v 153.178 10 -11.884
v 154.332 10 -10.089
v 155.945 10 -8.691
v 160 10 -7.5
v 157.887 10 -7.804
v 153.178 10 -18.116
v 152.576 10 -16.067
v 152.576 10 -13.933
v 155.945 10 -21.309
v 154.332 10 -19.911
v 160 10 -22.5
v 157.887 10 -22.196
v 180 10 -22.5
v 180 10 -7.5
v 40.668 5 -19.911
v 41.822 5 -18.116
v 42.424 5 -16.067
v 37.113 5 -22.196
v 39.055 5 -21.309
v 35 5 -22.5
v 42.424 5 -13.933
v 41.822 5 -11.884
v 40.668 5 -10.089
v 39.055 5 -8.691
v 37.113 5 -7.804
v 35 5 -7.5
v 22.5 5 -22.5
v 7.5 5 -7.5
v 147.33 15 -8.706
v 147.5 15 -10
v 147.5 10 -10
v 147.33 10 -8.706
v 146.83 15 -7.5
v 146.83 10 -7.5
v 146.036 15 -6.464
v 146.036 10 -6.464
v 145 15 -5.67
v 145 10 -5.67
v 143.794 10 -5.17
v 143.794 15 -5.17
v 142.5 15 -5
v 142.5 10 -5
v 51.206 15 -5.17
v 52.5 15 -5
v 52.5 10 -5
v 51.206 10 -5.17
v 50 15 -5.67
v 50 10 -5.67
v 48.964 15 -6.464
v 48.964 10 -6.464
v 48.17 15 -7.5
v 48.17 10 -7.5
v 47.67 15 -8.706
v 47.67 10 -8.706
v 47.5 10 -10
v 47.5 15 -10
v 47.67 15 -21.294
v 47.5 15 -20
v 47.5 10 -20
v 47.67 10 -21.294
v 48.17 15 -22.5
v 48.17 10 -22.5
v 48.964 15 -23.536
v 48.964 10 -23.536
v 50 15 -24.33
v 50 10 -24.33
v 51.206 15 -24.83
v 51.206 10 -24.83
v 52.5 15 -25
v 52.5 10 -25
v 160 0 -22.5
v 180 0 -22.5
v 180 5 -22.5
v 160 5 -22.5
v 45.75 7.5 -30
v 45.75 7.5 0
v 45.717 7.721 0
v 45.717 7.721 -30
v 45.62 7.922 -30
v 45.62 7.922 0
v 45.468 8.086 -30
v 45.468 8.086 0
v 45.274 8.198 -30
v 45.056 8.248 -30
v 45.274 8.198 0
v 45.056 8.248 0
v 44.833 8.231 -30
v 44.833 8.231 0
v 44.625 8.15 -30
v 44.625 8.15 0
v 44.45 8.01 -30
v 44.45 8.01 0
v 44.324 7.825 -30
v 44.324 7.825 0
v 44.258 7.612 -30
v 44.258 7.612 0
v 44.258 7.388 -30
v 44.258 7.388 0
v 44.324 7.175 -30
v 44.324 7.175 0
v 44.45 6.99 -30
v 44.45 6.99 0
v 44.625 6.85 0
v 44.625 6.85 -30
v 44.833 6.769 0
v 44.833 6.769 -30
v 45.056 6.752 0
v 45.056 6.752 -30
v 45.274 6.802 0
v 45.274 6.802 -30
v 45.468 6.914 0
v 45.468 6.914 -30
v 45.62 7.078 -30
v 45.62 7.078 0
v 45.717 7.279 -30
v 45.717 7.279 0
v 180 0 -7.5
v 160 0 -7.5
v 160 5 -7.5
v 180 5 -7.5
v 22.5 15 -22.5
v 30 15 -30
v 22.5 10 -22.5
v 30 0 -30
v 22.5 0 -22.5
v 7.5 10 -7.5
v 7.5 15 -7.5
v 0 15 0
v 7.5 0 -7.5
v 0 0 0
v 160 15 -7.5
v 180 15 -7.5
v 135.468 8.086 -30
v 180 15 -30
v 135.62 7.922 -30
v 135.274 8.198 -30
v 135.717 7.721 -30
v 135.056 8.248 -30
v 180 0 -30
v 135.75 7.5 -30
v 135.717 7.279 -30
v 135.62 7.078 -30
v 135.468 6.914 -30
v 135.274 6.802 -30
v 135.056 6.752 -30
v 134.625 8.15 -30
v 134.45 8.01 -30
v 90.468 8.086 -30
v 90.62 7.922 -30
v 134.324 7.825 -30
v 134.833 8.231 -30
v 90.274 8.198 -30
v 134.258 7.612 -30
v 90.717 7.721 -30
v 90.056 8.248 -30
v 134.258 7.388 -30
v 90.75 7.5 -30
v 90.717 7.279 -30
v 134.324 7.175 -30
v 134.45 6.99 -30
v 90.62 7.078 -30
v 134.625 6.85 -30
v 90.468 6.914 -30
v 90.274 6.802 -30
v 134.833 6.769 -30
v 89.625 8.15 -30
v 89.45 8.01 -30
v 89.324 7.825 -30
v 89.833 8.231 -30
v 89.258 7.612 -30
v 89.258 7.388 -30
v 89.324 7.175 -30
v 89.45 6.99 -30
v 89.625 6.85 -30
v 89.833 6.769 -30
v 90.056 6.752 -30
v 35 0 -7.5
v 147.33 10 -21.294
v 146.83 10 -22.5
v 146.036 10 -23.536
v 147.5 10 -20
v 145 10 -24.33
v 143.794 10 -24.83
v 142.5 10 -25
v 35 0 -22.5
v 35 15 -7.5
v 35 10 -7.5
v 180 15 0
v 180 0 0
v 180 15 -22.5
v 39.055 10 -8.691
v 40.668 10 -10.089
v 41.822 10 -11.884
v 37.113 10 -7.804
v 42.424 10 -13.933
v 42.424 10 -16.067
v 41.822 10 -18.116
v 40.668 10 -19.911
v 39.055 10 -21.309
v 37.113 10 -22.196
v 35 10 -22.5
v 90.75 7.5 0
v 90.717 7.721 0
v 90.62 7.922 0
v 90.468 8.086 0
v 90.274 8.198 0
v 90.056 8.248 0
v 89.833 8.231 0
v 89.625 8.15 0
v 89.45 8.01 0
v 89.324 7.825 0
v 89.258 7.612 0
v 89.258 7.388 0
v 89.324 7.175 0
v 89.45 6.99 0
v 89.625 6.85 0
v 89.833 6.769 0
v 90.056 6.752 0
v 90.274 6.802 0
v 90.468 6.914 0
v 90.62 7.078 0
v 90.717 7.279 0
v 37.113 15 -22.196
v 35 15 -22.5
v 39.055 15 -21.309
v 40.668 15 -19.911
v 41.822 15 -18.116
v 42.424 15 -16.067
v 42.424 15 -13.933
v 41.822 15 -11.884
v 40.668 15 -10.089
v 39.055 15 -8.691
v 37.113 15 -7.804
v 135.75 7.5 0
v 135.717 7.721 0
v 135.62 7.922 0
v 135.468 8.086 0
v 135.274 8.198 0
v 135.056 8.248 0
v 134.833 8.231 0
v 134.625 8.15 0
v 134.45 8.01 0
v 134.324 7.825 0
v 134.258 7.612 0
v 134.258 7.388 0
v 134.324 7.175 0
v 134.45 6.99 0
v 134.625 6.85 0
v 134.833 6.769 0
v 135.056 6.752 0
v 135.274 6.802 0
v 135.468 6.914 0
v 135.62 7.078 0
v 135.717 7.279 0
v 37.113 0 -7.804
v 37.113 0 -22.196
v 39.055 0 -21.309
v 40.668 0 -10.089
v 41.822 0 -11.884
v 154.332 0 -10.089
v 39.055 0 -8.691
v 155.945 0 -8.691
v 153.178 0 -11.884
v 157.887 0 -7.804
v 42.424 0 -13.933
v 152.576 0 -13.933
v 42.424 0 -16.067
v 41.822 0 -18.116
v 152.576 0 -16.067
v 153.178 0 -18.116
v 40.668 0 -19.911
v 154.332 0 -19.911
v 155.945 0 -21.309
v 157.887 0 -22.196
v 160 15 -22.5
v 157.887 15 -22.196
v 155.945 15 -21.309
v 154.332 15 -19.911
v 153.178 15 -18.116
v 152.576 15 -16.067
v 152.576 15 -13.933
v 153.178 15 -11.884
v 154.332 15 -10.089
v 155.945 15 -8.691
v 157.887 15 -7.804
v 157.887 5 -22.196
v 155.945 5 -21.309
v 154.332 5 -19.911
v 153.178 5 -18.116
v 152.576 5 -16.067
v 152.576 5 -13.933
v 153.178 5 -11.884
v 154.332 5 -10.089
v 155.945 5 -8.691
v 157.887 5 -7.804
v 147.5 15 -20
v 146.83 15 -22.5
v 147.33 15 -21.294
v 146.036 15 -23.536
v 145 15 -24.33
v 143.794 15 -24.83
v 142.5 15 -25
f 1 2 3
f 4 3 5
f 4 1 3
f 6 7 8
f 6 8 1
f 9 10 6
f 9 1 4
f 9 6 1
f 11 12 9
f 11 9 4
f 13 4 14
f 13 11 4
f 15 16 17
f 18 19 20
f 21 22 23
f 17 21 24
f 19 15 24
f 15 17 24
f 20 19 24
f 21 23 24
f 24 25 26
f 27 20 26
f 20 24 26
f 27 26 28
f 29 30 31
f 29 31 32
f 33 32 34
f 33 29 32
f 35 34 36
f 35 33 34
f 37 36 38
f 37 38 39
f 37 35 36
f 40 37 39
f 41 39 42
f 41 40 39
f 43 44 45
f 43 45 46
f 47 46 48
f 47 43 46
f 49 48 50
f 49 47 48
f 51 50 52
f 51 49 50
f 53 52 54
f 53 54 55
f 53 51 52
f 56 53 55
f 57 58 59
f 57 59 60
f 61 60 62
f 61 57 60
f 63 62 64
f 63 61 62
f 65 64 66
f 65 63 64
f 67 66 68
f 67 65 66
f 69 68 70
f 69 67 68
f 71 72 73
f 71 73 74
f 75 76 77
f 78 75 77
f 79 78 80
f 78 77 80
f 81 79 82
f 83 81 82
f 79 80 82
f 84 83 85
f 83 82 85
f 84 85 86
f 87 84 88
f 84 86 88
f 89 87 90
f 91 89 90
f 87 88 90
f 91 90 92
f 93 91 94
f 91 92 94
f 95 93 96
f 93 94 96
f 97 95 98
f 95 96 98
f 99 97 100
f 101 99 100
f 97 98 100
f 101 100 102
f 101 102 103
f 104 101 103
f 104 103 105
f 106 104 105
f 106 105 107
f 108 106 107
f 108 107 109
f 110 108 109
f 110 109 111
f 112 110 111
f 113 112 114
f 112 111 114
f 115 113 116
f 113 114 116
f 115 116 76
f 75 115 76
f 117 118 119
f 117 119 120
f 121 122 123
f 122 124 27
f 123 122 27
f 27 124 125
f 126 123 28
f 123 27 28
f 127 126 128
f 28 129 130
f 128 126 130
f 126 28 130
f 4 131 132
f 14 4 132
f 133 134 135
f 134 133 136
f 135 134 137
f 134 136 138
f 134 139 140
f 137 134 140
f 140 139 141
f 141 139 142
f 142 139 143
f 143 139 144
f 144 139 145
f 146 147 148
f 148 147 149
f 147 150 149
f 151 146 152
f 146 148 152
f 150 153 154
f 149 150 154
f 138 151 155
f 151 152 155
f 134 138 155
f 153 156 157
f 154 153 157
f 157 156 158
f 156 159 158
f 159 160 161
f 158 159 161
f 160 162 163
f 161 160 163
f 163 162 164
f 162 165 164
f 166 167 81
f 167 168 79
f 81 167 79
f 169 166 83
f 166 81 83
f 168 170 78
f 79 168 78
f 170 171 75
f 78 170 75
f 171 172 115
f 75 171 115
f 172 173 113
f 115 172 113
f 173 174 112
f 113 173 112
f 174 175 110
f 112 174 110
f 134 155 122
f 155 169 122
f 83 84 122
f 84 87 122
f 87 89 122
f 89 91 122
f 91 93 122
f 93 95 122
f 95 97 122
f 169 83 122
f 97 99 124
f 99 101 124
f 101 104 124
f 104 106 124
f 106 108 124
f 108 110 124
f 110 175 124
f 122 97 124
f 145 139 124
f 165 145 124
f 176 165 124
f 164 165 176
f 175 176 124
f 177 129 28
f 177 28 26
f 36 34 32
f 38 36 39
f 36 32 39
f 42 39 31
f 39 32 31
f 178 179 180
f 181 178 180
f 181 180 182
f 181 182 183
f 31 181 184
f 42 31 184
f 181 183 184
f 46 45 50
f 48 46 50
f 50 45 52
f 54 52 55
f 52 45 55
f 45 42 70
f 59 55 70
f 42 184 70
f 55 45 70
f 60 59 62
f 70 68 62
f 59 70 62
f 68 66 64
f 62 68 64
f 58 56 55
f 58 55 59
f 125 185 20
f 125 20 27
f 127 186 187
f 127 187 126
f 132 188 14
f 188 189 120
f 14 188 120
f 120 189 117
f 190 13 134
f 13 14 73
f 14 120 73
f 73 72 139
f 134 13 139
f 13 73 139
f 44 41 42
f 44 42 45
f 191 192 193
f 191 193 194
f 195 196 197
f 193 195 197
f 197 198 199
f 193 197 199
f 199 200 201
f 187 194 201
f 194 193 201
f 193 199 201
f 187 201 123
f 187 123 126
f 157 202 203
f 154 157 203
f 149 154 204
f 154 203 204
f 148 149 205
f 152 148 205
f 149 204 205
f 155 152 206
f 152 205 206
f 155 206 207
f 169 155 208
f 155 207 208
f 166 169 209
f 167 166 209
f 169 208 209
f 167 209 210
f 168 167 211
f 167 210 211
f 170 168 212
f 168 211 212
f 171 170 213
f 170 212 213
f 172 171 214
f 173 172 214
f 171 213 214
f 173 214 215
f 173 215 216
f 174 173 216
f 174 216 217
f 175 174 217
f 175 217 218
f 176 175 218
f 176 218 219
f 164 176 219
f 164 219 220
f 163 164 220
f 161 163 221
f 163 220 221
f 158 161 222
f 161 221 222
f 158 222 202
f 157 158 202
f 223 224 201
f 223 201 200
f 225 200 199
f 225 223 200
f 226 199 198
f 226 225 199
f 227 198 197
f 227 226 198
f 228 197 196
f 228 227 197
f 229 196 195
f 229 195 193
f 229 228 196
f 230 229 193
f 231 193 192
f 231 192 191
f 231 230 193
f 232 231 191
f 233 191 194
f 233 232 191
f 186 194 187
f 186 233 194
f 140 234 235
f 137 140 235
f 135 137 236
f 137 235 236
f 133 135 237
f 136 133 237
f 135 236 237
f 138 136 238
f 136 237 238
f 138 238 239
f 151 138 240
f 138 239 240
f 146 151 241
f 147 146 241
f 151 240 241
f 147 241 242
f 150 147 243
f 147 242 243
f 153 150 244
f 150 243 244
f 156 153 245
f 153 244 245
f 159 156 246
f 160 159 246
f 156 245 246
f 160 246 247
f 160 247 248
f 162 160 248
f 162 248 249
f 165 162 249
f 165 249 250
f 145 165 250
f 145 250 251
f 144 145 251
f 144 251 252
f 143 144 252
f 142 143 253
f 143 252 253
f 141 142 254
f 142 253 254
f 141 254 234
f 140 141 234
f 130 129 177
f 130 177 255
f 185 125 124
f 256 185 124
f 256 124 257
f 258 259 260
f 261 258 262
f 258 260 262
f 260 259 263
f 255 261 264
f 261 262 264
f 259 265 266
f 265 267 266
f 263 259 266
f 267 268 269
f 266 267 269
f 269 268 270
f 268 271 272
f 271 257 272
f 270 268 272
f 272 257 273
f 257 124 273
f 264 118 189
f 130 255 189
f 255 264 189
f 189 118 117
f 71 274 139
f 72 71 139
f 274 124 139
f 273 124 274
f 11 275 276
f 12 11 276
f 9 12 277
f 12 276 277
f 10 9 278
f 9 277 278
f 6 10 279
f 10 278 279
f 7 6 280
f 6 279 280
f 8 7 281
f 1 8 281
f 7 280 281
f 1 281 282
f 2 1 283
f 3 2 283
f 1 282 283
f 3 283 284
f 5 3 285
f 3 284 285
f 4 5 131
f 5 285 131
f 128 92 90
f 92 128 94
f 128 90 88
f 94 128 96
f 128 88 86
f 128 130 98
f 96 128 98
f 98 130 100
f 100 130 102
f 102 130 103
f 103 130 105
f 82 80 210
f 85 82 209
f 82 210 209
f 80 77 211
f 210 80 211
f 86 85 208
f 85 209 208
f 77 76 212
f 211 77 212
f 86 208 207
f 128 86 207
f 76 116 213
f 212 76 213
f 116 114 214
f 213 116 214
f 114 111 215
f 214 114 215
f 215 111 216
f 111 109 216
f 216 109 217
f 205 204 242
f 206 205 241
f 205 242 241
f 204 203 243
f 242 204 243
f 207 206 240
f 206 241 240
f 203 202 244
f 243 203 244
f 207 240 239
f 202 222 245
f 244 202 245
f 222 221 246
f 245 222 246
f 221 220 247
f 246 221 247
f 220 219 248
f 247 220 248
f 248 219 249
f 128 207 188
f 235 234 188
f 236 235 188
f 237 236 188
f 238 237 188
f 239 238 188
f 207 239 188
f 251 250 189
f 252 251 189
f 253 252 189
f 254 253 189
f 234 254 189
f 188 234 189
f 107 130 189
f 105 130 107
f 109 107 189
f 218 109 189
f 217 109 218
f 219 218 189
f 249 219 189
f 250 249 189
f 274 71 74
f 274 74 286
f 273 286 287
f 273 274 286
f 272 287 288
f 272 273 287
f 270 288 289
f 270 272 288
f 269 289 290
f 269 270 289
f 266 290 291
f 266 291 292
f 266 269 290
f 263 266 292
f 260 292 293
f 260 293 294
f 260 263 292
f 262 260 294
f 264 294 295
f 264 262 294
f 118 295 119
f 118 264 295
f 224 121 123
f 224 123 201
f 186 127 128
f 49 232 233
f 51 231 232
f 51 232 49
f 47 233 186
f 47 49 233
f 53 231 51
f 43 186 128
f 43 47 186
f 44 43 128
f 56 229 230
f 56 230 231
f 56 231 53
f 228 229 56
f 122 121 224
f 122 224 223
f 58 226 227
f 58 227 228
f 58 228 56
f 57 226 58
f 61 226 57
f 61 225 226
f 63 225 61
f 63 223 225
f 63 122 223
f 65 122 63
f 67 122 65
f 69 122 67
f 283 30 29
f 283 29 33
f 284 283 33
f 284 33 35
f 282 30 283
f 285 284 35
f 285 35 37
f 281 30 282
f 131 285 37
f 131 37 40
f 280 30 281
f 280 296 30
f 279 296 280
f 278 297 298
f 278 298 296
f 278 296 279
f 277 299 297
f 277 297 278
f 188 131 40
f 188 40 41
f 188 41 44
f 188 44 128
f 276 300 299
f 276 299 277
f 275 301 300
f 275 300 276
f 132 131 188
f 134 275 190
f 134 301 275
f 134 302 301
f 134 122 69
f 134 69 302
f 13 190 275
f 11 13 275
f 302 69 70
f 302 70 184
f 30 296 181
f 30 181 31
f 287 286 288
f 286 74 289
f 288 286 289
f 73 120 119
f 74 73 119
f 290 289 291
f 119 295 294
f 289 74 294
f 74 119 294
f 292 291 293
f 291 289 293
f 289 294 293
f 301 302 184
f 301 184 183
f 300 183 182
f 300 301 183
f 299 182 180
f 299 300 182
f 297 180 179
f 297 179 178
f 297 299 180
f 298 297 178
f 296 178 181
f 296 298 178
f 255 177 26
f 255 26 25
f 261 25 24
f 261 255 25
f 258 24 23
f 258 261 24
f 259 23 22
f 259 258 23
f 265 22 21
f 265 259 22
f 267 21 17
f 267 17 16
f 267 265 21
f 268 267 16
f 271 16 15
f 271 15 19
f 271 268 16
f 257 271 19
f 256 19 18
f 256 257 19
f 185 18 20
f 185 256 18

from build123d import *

# Parameters (mm, degrees)
BOSS_EXTRUDE1_DEPTH = 15
CUT_EXTRUDE1_DEPTH  = 5
CUT_EXTRUDE2_DEPTH  = 5
SKETCH4_R           = 0.75
CUT_EXTRUDE3_DEPTH  = 30
CUT_EXTRUDE4_DEPTH  = 5


with BuildPart() as part:
    # Sketch1 → Boss-Extrude1 (new body)
    with BuildSketch(Plane(origin=(0, 0, 0), x_dir=(1, 0, 0), z_dir=(0, 1, 0))):
        Polygon((0, 0), (180, 0), (180, 30), (30, 30), align=None)
    extrude(amount=BOSS_EXTRUDE1_DEPTH)

    # Sketch2 → Cut-Extrude1 (cut)
    with BuildSketch(Plane(origin=(0, 15, 0), x_dir=(1, 0, 0), z_dir=(0, 1, 0))):
        with BuildLine():
            Line((-5, 22.5), (35, 22.5))
            ThreePointArc((35, 22.5), (42.5, 15), (35, 7.5))
            Line((35, 7.5), (-5, 7.5))
            ThreePointArc((-5, 7.5), (-12.5, 15), (-5, 22.5))
        make_face()
        with BuildLine():
            Line((200, 22.5), (160, 22.5))
            ThreePointArc((160, 22.5), (152.5, 15), (160, 7.5))
            Line((160, 7.5), (200, 7.5))
            ThreePointArc((200, 7.5), (207.5, 15), (200, 22.5))
        make_face()
    extrude(amount=-CUT_EXTRUDE1_DEPTH, mode=Mode.SUBTRACT)

    # Sketch3 → Cut-Extrude2 (cut)
    with BuildSketch(Plane.XZ):
        with BuildLine():
            Line((22.5, -22.5), (7.5, -7.5))
            Line((7.5, -7.5), (35, -7.5))
            ThreePointArc((35, -7.5), (42.5, -15), (35, -22.5))
            Line((35, -22.5), (22.5, -22.5))
        make_face()
        with BuildLine():
            Line((180, -7.5), (180, -22.5))
            Line((180, -22.5), (160, -22.5))
            ThreePointArc((160, -22.5), (152.5, -15), (160, -7.5))
            Line((160, -7.5), (180, -7.5))
        make_face()
    extrude(amount=-CUT_EXTRUDE2_DEPTH, mode=Mode.SUBTRACT)

    # Sketch4 → Cut-Extrude3 (cut)
    with BuildSketch(Plane.XY):
        with Locations((90, 7.5)):
            Circle(SKETCH4_R)
        with Locations((45, 7.5)):
            Circle(SKETCH4_R)
        with Locations((135, 7.5)):
            Circle(SKETCH4_R)
    extrude(amount=-CUT_EXTRUDE3_DEPTH, mode=Mode.SUBTRACT)

    # Sketch5 → Cut-Extrude4 (cut)
    with BuildSketch(Plane(origin=(0, 15, 0), x_dir=(1, 0, 0), z_dir=(0, 1, 0))):
        with BuildLine():
            Line((52.5, 25), (142.5, 25))
            ThreePointArc((142.5, 25), (146.035533906, 23.535533906), (147.5, 20))
            Line((147.5, 20), (147.5, 10))
            ThreePointArc((147.5, 10), (146.035533906, 6.464466094), (142.5, 5))
            Line((142.5, 5), (52.5, 5))
            ThreePointArc((52.5, 5), (48.964466094, 6.464466094), (47.5, 10))
            Line((47.5, 10), (47.5, 20))
            ThreePointArc((47.5, 20), (48.964466094, 23.535533906), (52.5, 25))
        make_face()
    extrude(amount=-CUT_EXTRUDE4_DEPTH, mode=Mode.SUBTRACT)


solid = part.part
